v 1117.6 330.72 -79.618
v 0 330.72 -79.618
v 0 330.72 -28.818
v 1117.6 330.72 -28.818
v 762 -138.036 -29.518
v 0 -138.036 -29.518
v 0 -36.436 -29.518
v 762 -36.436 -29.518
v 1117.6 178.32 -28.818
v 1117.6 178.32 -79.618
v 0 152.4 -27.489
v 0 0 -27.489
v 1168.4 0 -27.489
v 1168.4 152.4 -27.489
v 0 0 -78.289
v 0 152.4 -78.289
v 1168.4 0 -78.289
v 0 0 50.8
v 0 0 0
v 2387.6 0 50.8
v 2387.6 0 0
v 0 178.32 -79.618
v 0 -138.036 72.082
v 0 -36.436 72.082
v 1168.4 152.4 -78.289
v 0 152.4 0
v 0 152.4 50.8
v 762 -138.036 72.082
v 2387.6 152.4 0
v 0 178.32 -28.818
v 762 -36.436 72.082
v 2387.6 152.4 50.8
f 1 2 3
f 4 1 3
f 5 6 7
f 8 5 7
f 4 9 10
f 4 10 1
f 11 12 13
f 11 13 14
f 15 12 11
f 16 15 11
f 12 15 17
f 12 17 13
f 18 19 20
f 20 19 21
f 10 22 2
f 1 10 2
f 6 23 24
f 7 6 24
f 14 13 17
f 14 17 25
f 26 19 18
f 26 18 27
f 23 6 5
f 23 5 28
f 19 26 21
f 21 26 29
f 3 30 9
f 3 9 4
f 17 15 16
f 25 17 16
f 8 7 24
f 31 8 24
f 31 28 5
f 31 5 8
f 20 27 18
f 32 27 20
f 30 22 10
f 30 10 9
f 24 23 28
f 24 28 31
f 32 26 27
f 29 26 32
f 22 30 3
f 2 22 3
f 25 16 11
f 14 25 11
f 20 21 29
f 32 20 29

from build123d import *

# Parameters (mm, degrees)
F0_W     = 2387.6
F0_H     = 152.4
F1_DEPTH = 50.8
F2_W     = 101.6
F2_H     = 101.6
F3_DEPTH = 762
F4_W     = 152.4
F4_H     = 50.8
F5_DEPTH = 1168.4
F6_W     = 152.4
F6_H     = 50.8
F7_DEPTH = 1117.6


with BuildPart() as f1:
    # F0 (on Top) → F1 (new body)
    with BuildSketch(Plane.XY):
        with Locations((1193.8, 76.2)):
            Rectangle(F0_W, F0_H)
    extrude(amount=F1_DEPTH)


with BuildPart() as f3:
    # F2 (on Right) → F3 (new body)
    with BuildSketch(Plane.YZ):
        with Locations((-87.235643, 21.28173)):
            Rectangle(F2_W, F2_H)
    extrude(amount=F3_DEPTH)


with BuildPart() as f5:
    # F4 (on Right) → F5 (new body)
    with BuildSketch(Plane.YZ):
        with Locations((76.2, -52.889361)):
            Rectangle(F4_W, F4_H)
    extrude(amount=F5_DEPTH)


with BuildPart() as f7:
    # F6 (on Right) → F7 (new body)
    with BuildSketch(Plane.YZ):
        with Locations((254.520491, -54.217565)):
            Rectangle(F6_W, F6_H)
    extrude(amount=F7_DEPTH)


solid = Compound([f1.part, f3.part, f5.part, f7.part])
